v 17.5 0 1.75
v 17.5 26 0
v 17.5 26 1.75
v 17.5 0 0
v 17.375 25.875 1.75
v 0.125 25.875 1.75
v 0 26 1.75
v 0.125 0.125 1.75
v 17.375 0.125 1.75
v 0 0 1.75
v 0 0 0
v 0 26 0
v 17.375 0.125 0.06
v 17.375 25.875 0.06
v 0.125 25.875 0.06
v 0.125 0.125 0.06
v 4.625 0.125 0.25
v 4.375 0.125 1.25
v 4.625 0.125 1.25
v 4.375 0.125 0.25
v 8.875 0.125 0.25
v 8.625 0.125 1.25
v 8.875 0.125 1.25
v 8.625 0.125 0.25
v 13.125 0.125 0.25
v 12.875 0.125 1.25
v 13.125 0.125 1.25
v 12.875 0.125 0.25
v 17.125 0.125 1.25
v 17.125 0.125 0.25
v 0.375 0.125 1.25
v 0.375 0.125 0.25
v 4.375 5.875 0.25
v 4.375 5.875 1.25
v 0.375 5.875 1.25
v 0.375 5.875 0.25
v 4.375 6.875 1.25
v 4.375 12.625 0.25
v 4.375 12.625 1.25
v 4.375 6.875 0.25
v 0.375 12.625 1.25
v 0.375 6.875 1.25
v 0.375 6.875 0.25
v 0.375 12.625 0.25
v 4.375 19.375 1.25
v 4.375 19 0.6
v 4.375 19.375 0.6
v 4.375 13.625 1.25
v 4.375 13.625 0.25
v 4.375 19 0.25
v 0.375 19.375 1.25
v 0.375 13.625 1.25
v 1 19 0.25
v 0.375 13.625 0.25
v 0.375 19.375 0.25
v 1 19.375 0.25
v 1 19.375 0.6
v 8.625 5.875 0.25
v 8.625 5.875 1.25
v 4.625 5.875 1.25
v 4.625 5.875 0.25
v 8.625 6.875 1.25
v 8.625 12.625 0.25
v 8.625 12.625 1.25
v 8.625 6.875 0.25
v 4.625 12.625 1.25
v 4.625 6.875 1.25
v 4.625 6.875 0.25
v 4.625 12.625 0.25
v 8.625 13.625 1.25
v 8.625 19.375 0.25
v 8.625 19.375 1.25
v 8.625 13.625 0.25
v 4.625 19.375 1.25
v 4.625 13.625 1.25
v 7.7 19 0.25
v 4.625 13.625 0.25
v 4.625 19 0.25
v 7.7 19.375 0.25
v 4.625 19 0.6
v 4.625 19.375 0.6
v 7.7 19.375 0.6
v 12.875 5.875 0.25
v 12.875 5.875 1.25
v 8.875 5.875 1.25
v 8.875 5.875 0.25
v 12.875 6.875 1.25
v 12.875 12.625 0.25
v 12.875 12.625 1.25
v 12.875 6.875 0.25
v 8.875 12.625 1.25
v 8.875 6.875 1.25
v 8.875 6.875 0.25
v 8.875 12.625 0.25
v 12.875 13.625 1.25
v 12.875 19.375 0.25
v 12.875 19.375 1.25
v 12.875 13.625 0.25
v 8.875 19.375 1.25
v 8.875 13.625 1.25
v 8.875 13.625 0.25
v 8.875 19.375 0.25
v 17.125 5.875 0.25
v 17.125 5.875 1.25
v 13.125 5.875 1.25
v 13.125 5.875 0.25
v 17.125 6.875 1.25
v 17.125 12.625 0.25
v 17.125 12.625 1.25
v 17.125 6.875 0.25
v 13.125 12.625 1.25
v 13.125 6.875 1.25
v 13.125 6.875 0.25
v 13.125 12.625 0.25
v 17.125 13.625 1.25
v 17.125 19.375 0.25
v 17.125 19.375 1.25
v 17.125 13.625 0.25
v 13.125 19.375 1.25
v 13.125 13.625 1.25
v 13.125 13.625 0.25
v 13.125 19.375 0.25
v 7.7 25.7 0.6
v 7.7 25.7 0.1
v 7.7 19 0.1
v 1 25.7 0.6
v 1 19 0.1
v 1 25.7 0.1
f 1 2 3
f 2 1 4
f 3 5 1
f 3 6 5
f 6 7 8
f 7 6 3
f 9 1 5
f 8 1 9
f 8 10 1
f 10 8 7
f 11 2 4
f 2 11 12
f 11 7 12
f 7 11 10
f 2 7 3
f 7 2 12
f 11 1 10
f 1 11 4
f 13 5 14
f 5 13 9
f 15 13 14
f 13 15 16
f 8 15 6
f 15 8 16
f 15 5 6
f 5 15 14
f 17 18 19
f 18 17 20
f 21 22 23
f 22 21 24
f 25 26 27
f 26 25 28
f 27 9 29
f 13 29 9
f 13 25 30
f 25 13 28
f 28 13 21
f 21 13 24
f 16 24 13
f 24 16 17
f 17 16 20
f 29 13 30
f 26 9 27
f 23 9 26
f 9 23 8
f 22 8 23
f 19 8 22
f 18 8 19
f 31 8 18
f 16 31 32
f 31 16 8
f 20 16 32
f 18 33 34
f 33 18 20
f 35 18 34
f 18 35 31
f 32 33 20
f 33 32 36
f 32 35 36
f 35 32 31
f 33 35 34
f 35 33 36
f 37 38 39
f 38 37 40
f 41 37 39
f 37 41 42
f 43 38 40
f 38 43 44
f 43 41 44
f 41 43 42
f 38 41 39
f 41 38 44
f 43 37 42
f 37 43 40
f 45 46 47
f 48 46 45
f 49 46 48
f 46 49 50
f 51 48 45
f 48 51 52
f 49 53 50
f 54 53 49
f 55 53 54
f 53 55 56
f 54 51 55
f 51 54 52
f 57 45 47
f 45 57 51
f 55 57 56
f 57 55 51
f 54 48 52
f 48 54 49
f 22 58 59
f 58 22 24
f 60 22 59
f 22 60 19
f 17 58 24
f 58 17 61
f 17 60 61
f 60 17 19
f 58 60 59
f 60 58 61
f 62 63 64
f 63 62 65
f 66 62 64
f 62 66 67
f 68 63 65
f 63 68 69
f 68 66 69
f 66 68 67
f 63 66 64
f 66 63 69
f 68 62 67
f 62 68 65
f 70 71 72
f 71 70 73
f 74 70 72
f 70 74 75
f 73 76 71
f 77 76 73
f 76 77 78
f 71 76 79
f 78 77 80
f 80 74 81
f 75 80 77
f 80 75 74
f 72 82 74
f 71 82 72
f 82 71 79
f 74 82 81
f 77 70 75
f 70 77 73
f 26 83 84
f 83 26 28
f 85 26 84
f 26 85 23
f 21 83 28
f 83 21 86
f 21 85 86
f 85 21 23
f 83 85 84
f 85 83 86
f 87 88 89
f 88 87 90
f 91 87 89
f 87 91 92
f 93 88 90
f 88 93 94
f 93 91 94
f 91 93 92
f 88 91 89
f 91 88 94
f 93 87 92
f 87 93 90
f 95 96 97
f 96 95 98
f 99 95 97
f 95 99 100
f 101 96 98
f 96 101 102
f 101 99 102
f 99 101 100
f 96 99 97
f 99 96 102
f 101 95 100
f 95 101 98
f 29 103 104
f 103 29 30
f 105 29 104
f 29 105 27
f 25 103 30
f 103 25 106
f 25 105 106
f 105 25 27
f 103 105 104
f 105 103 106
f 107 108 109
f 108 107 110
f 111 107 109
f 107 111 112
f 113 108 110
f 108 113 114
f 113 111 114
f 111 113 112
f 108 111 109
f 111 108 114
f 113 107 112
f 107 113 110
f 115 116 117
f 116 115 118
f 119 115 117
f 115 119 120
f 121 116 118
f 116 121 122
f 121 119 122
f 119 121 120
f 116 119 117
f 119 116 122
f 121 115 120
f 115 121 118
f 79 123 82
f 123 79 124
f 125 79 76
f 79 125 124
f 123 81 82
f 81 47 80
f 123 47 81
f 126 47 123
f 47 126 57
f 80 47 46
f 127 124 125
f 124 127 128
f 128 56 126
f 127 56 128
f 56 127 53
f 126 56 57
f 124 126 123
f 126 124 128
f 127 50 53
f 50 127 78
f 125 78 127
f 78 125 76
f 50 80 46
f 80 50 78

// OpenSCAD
//Number of Drives
DriveNumX=3;
DriveNumY=4;

//drive offset
DriveOffsetX1=3/8;
DriveOffsetX2=1/4;
DriveOffsetY=0;
DriveOffsetZ=0.25;

//drive spacing
DriveSpace=1;
DriveInset=1;
DriveBaseOffset=0.125;

//drive demintions
DriveLength=5.75;
DriveWidth=4;
DriveHeight=1;



difference(){
//inches
cube([17.5,26,1.75]);
translate([0.125,0.125,0.06]) cube([17.25,25.75,1.7]);
}
//Drives
for (J = [0 : DriveNumY-1])
{
	for (Z = [0 : DriveNumX-1])
	{
		translate([DriveOffsetX1+DriveWidth*J+DriveOffsetX2*J,DriveBaseOffset+DriveSpace*Z+DriveLength*Z,DriveOffsetZ]) cube([DriveWidth,DriveLength,DriveHeight]);
	}
}

//Mobo
translate([1,19,0.1]) cube([6.7,6.7,0.5]);

//PSU
